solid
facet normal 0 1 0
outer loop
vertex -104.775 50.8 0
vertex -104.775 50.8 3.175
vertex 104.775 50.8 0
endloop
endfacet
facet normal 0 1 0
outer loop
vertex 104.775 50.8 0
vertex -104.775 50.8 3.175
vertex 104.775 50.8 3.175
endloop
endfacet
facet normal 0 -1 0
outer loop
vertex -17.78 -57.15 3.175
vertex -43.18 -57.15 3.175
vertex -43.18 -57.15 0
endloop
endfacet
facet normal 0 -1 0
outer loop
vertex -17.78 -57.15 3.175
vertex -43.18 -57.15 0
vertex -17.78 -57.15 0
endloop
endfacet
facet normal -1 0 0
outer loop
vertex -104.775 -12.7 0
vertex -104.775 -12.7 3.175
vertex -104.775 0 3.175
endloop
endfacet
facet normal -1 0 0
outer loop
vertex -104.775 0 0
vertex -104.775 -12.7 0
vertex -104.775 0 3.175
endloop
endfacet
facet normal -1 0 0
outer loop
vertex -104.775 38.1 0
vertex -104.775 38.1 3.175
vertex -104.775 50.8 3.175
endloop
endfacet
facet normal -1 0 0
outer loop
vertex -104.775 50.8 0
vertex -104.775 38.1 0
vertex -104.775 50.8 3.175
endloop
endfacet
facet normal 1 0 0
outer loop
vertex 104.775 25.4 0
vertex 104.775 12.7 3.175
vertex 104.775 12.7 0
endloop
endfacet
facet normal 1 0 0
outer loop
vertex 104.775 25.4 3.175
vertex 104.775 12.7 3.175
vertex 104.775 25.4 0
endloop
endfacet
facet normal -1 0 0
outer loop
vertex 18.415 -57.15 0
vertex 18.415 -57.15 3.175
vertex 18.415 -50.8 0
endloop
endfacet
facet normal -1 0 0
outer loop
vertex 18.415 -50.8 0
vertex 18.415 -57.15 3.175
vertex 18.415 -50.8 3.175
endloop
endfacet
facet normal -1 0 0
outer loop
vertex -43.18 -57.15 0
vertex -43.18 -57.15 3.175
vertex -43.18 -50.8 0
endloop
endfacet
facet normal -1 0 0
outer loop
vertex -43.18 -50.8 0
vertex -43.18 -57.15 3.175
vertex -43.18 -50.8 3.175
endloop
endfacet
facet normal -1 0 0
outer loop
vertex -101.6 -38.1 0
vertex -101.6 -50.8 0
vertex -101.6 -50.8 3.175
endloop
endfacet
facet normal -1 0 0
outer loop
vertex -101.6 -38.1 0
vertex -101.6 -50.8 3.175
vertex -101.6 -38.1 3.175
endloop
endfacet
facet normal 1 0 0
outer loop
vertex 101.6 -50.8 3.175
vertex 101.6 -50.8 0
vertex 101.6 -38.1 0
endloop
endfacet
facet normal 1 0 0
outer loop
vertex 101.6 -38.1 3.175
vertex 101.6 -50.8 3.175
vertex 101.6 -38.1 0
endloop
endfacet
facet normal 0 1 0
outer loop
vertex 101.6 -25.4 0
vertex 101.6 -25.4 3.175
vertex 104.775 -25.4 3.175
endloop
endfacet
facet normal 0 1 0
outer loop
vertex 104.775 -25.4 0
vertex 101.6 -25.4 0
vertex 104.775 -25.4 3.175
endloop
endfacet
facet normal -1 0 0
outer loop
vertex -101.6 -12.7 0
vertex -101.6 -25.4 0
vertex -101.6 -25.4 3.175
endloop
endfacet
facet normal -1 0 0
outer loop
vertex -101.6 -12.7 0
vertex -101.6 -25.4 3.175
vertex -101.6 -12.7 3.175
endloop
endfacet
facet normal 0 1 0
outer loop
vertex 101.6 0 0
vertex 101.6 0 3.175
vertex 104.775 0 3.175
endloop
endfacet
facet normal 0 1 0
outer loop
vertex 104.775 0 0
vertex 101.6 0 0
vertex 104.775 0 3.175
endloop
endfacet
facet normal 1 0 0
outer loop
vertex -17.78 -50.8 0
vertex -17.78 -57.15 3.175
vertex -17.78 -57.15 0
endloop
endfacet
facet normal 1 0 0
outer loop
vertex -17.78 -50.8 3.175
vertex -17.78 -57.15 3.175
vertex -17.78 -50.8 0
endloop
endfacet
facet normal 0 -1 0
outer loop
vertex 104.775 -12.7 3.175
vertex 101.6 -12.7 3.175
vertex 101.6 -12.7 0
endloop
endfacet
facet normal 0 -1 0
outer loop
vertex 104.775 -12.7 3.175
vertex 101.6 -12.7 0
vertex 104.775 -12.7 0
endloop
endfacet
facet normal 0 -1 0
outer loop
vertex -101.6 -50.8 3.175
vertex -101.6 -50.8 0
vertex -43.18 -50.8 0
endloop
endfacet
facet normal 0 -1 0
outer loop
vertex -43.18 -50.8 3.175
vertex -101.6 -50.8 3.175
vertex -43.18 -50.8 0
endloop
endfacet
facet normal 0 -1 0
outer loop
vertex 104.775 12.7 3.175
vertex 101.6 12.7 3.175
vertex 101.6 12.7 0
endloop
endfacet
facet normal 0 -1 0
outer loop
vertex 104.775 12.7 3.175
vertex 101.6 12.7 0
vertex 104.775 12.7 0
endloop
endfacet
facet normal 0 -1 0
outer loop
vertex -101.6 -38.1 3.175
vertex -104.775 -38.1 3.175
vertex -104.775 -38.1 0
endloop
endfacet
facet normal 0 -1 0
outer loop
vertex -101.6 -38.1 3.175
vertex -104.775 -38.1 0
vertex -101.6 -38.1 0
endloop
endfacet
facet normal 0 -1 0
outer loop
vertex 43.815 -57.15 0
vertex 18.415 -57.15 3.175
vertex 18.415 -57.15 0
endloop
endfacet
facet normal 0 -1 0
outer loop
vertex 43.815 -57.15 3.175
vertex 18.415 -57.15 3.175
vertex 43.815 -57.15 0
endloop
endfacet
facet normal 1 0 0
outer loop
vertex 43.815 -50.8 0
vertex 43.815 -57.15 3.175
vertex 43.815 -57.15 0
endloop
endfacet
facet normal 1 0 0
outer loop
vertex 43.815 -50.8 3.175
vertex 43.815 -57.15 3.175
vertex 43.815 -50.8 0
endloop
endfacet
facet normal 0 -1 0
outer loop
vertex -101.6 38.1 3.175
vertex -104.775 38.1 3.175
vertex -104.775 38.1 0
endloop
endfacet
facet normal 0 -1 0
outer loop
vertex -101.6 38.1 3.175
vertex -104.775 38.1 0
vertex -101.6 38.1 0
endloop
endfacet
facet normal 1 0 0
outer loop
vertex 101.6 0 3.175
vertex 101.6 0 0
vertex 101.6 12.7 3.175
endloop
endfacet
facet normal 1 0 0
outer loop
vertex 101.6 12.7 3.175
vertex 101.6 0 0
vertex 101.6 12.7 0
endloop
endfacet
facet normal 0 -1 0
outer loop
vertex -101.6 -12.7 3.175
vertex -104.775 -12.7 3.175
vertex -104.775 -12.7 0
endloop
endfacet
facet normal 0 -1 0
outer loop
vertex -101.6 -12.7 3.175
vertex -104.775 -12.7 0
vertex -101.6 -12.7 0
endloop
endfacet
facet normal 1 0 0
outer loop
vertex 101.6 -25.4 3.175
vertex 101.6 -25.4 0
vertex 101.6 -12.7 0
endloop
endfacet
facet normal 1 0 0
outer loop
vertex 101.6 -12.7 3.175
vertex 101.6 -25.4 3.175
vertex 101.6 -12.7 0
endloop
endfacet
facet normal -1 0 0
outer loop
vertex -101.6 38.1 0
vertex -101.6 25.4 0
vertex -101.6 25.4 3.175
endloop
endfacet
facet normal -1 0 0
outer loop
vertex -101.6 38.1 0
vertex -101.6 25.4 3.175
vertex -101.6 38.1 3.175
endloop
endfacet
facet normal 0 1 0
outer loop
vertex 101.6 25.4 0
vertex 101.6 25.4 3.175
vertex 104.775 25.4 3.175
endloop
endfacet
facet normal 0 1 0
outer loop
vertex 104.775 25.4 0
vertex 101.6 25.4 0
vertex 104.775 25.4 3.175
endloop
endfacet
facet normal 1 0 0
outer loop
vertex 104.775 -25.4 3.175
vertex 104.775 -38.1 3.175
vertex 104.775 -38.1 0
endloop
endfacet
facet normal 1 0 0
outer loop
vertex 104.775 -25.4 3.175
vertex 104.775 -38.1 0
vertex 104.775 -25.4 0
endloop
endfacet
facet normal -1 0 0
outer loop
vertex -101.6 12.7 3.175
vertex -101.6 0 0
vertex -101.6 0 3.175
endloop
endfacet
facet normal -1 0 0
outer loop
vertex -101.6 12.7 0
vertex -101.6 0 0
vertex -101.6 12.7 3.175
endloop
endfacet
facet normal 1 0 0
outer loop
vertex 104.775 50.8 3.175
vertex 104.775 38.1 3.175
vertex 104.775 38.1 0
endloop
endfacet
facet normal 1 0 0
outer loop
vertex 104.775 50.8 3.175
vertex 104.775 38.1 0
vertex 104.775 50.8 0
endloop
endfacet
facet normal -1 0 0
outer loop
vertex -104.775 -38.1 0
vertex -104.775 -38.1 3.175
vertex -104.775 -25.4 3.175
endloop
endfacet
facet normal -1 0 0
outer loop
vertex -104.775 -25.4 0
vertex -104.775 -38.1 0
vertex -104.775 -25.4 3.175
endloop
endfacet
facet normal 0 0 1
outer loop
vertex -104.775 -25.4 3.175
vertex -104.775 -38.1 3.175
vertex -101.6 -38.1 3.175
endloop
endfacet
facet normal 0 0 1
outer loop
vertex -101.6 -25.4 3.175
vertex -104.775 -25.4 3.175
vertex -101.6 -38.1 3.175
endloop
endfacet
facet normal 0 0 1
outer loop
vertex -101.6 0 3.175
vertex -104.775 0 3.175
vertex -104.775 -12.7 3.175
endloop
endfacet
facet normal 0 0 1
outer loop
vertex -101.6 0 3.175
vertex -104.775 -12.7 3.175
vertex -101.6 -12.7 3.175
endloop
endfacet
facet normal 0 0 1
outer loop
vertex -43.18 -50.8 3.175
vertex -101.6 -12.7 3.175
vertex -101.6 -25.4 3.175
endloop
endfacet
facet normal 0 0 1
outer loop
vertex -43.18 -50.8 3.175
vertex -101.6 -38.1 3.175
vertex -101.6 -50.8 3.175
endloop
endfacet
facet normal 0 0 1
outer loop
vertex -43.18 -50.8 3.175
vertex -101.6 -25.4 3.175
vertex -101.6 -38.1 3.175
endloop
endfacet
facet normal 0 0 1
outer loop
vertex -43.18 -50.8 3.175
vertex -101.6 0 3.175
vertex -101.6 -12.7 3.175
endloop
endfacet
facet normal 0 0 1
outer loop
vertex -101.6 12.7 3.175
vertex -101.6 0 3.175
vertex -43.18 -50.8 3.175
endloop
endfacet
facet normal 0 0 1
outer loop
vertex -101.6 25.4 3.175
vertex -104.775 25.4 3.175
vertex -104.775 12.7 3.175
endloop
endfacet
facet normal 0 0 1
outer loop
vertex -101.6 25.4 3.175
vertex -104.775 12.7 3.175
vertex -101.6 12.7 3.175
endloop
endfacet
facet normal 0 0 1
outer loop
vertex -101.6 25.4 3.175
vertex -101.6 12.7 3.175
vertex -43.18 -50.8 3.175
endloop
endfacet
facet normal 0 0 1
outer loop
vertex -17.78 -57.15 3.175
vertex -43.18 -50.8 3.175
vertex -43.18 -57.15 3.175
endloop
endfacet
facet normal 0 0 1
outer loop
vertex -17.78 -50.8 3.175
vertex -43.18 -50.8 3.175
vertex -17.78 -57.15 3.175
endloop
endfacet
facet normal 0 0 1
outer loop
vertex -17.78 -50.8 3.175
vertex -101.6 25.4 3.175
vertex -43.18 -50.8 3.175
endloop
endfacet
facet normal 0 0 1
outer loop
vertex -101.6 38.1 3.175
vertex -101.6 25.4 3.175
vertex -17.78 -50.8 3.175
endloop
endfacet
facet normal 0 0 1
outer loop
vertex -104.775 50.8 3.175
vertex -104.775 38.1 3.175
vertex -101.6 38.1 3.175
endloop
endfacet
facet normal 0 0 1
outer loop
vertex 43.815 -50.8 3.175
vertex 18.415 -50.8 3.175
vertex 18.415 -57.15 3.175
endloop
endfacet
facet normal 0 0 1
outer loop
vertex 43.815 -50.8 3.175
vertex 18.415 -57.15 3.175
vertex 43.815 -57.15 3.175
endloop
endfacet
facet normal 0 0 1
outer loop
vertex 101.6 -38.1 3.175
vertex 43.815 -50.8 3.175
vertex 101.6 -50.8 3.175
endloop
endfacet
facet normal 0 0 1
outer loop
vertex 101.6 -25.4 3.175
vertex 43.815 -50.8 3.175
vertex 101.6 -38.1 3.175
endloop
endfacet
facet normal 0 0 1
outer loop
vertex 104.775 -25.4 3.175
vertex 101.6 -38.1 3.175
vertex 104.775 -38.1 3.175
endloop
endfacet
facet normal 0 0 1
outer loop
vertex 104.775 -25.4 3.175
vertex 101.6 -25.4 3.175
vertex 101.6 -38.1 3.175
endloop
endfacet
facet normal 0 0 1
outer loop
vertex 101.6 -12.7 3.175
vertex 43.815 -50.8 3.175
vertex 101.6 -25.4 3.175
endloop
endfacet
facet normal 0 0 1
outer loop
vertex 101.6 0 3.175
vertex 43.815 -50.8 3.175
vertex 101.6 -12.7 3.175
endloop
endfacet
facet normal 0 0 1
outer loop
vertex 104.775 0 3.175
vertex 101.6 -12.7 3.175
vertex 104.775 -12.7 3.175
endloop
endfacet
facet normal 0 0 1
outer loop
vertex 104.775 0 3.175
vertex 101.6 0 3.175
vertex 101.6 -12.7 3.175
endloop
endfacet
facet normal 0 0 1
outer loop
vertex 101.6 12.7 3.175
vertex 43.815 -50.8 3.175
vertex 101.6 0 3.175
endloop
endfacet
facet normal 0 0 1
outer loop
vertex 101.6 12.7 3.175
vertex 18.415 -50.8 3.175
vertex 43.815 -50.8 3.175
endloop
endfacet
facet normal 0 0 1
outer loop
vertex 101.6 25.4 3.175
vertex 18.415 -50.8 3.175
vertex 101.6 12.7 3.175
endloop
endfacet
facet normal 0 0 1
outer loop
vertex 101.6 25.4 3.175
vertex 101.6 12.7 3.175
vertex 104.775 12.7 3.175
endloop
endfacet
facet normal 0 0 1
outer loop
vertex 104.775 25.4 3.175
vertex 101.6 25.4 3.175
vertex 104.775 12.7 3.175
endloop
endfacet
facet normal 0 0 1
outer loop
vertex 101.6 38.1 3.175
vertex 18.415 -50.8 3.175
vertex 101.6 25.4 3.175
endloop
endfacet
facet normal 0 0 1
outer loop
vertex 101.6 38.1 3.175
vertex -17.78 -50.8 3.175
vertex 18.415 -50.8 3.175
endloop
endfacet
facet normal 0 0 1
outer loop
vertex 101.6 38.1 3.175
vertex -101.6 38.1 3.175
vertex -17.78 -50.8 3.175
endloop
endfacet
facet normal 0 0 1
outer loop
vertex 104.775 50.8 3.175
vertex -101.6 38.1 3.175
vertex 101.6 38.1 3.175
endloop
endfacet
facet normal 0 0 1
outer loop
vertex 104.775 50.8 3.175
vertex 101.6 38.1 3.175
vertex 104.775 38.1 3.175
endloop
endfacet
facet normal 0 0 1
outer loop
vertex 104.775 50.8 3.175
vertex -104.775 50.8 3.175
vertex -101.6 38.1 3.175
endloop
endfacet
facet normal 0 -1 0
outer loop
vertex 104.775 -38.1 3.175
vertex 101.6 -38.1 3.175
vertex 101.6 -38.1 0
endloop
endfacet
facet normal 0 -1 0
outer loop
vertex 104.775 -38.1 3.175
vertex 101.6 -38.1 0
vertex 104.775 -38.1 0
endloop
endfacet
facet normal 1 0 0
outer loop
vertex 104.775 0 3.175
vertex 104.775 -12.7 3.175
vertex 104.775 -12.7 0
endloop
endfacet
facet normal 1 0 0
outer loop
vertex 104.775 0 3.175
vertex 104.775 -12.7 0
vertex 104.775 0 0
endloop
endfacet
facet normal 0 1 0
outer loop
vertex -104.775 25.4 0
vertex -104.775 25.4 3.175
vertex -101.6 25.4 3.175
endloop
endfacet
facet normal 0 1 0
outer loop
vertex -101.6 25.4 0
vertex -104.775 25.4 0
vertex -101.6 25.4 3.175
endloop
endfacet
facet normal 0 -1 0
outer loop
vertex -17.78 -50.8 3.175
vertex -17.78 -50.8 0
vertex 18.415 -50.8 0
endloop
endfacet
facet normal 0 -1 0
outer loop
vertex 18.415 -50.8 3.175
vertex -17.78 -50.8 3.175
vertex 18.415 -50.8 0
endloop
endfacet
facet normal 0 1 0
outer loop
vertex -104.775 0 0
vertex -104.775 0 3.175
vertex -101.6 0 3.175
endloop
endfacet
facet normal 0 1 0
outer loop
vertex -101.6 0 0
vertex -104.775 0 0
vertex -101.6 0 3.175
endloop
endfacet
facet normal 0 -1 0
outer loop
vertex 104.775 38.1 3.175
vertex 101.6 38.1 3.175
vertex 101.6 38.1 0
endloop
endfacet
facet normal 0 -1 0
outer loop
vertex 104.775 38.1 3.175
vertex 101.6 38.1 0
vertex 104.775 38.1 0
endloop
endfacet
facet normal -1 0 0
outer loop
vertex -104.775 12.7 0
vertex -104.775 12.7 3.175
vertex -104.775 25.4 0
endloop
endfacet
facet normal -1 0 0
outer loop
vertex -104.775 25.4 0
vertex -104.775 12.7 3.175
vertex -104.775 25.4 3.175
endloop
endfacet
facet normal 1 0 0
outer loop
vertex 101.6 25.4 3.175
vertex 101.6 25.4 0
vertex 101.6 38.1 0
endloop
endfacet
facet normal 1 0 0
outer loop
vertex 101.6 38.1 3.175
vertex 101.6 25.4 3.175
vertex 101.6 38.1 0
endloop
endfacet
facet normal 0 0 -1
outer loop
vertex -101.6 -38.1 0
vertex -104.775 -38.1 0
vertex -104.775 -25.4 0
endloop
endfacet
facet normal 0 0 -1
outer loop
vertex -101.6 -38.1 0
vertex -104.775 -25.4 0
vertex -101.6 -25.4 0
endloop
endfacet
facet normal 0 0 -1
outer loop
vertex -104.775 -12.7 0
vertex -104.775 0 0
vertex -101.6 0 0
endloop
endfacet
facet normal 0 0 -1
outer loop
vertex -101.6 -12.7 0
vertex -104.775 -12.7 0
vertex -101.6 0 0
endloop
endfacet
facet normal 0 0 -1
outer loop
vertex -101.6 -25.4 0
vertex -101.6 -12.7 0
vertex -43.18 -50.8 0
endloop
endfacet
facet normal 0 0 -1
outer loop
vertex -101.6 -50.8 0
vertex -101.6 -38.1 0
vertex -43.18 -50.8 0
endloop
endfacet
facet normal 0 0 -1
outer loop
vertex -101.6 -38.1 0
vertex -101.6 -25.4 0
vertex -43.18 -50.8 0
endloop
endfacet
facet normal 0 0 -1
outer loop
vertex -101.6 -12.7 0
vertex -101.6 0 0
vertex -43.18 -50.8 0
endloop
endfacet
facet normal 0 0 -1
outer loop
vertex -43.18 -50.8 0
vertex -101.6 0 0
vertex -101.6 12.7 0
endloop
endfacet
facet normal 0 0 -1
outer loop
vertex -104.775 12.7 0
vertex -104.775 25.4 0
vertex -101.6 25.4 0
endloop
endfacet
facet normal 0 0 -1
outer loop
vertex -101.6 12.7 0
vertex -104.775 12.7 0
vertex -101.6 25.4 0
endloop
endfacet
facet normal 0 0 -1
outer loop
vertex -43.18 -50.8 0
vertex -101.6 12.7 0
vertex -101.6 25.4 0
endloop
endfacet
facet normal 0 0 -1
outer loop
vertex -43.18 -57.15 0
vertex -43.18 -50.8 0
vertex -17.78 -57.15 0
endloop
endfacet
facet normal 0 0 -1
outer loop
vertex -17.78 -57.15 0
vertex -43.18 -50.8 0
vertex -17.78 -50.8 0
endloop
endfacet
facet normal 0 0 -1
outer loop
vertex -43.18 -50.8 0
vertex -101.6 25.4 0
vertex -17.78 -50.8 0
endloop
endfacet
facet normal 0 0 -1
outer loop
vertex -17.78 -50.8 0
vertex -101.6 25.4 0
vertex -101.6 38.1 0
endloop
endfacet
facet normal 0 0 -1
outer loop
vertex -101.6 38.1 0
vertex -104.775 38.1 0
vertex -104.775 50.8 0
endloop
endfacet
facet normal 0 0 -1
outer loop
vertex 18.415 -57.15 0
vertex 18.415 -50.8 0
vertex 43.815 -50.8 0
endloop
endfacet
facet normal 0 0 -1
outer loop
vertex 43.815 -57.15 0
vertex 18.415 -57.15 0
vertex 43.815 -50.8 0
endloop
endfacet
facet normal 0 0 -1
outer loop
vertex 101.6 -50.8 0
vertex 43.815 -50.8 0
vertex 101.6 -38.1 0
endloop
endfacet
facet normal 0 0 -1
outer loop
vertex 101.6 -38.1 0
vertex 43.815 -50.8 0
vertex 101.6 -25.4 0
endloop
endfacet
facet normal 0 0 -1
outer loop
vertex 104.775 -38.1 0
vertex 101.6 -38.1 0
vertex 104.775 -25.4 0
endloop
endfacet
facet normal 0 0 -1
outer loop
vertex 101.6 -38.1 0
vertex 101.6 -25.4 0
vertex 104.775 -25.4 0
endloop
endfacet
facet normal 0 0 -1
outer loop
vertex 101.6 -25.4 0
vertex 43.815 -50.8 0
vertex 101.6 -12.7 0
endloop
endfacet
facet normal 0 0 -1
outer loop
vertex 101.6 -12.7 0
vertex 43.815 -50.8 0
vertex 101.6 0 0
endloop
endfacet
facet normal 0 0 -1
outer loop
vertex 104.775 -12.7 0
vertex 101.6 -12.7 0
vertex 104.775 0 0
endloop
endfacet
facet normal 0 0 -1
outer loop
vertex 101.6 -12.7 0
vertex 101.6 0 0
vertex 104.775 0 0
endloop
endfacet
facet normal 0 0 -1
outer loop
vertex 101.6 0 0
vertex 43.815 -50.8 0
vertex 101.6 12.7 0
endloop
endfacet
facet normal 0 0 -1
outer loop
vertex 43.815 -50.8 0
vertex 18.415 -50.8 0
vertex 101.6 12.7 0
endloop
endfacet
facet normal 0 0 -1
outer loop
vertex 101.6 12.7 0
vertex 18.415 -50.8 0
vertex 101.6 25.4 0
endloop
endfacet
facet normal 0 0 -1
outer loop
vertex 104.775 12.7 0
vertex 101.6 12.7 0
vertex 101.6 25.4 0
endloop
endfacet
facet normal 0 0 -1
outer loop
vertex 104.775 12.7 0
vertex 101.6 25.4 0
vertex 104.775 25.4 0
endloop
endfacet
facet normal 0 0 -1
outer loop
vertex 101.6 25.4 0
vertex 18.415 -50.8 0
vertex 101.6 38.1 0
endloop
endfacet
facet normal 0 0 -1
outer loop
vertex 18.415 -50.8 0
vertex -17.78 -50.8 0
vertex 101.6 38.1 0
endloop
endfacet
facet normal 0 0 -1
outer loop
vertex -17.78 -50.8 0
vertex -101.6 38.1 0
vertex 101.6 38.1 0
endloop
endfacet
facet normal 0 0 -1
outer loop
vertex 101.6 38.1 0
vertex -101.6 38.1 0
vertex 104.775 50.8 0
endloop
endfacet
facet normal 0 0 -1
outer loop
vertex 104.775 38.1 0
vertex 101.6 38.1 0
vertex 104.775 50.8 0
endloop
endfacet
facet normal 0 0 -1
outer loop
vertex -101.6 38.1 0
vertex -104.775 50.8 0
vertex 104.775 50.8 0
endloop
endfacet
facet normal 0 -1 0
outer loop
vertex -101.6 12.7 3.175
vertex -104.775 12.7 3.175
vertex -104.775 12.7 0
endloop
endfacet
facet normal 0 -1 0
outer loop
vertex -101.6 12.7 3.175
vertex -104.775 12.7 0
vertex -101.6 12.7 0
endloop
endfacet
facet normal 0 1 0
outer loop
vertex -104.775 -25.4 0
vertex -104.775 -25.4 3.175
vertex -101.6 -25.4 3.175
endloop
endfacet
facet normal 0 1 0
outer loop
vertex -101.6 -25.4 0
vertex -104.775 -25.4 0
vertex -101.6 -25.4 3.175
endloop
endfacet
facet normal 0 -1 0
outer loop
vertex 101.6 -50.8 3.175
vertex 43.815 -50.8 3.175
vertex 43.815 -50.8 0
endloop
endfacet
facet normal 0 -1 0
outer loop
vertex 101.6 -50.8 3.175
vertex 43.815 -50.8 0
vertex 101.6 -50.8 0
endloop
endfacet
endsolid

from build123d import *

# Parameters (mm, degrees)
SKETCH1_W           = 203.2
SKETCH1_H           = 101.6
BOSS_EXTRUDE1_DEPTH = 3.175
SKETCH2_W           = 3.175
SKETCH2_H           = 12.7
SKETCH2_W_2         = 25.4
SKETCH2_H_2         = 6.35
BOSS_EXTRUDE2_DEPTH = 3.175
SKETCH3_W           = 25.4
SKETCH3_H           = 6.35
CUT_EXTRUDE1_DEPTH  = 120.947785411


with BuildPart() as part:
    # Sketch1 → Boss-Extrude1 (new body)
    with BuildSketch(Plane.XY):
        Rectangle(SKETCH1_W, SKETCH1_H)
    extrude(amount=BOSS_EXTRUDE1_DEPTH)

    # Sketch2 → Boss-Extrude2 (add)
    with BuildSketch(Plane.XY.offset(3.175)):
        with Locations((-103.1875, 19.05)):
            Rectangle(SKETCH2_W, SKETCH2_H)
        with Locations((-103.1875, 44.45)):
            Rectangle(SKETCH2_W, SKETCH2_H)
        with Locations((-103.1875, -6.35)):
            Rectangle(SKETCH2_W, SKETCH2_H)
        with Locations((-103.1875, -31.75)):
            Rectangle(SKETCH2_W, SKETCH2_H)
        with Locations((-92.075, -53.975)):
            Rectangle(SKETCH2_W_2, SKETCH2_H_2)
        with Locations((-30.48, -53.975)):
            Rectangle(SKETCH2_W_2, SKETCH2_H_2)
        with Locations((31.115, -53.975)):
            Rectangle(SKETCH2_W_2, SKETCH2_H_2)
        with Locations((92.71, -53.975)):
            Rectangle(SKETCH2_W_2, SKETCH2_H_2)
        with Locations((103.1875, -31.75)):
            Rectangle(SKETCH2_W, SKETCH2_H)
        with Locations((103.1875, -6.35)):
            Rectangle(SKETCH2_W, SKETCH2_H)
        with Locations((103.1875, 19.05)):
            Rectangle(SKETCH2_W, SKETCH2_H)
        with Locations((103.1875, 44.45)):
            Rectangle(SKETCH2_W, SKETCH2_H)
    extrude(amount=-BOSS_EXTRUDE2_DEPTH)

    # Sketch3 → Cut-Extrude1 (cut, through all)
    with BuildSketch(Plane.XY.offset(3.175)):
        with Locations((-92.075, -53.975)):
            Rectangle(SKETCH3_W, SKETCH3_H)
        with Locations((92.71, -53.975)):
            Rectangle(SKETCH3_W, SKETCH3_H)
    extrude(amount=-CUT_EXTRUDE1_DEPTH, mode=Mode.SUBTRACT)


solid = part.part
